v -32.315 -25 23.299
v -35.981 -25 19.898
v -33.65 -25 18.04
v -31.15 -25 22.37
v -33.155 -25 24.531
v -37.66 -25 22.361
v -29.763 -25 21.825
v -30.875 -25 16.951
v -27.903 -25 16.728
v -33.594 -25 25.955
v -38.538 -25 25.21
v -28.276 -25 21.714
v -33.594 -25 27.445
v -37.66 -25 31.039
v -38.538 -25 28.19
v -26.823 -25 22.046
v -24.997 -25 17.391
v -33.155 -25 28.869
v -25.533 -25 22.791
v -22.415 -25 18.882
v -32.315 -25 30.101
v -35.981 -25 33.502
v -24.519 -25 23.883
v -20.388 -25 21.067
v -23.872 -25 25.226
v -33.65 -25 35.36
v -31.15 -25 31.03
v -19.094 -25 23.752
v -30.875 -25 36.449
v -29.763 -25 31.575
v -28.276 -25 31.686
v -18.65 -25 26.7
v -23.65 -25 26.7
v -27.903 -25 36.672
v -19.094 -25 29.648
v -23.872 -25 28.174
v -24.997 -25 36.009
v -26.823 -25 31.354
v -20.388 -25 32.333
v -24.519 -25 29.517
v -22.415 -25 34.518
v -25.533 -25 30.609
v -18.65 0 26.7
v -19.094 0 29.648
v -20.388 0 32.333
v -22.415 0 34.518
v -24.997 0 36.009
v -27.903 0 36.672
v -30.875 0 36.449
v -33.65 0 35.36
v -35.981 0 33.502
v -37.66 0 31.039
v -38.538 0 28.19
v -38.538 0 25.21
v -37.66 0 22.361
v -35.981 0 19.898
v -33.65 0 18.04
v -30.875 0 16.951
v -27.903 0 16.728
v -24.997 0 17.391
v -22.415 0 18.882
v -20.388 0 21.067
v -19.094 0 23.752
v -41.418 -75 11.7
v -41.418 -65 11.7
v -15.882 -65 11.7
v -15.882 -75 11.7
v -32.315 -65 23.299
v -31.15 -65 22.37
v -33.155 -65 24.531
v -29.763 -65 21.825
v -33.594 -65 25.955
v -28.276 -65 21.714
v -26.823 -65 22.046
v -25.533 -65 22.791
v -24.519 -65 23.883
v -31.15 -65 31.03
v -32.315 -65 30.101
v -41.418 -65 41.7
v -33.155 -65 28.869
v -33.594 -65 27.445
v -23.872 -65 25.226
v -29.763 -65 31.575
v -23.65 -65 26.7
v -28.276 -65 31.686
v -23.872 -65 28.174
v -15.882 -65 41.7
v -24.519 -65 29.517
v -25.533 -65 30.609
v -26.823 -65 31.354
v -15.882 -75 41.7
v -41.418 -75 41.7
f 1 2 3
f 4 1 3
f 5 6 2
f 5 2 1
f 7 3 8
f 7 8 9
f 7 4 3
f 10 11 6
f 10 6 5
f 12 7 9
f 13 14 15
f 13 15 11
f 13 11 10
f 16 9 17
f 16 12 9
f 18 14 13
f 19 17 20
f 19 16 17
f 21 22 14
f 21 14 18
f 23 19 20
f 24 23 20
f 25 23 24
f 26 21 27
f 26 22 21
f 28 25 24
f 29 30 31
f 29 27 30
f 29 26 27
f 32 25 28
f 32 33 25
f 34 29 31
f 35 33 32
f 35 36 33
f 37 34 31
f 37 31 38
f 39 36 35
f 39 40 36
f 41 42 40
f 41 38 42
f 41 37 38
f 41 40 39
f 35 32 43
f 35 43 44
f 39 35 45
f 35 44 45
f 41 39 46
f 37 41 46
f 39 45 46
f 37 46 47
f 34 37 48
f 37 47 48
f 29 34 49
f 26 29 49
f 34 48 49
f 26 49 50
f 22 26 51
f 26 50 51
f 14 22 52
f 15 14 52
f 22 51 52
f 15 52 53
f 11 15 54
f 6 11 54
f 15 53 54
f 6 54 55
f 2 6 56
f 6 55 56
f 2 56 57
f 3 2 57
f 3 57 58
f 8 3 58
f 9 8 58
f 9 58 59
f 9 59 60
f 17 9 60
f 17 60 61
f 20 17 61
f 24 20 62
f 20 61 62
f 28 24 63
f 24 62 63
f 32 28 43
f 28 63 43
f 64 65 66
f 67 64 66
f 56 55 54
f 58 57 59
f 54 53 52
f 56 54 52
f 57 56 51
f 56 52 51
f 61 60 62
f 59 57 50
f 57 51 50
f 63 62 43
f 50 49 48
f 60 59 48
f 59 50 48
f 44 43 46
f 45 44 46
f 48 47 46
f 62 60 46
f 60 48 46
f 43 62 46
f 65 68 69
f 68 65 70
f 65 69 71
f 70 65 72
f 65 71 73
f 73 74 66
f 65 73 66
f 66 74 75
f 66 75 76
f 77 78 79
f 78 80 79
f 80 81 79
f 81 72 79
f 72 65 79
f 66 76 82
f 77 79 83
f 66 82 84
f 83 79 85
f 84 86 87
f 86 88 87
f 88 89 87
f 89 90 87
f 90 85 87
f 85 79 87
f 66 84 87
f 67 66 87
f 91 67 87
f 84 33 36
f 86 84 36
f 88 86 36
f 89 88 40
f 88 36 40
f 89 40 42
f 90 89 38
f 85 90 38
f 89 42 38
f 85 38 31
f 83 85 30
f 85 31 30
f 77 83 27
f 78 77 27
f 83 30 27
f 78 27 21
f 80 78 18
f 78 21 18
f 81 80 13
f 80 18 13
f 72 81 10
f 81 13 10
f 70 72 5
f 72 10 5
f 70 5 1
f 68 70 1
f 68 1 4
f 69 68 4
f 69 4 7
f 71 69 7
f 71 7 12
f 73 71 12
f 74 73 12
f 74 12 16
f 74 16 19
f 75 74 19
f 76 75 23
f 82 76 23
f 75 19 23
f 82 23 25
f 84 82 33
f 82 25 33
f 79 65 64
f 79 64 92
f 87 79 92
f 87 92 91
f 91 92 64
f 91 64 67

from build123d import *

# Parameters (mm, degrees)
F0_R     = 10
F1_DEPTH = 25
F2_R     = 5
F3_DEPTH = 40
F4_W     = 25.535787
F4_H     = 30
F5_DEPTH = 10


with BuildPart() as f1:
    # F0 (on Front) → F1 (new body)
    with BuildSketch(Plane.XZ):
        with Locations((-28.650001, 26.700001)):
            Circle(F0_R)
    extrude(amount=F1_DEPTH)

    # F2 (on face) → F3 (join)
    with BuildSketch(Plane.XZ.offset(25)):
        with Locations((-28.650001, 26.700001)):
            Circle(F2_R)
    extrude(amount=F3_DEPTH)

    # F4 (on face) → F5 (join)
    with BuildSketch(Plane.XZ.offset(65)):
        with Locations((-28.65, 26.700001)):
            Rectangle(F4_W, F4_H)
    extrude(amount=F5_DEPTH)


solid = f1.part
